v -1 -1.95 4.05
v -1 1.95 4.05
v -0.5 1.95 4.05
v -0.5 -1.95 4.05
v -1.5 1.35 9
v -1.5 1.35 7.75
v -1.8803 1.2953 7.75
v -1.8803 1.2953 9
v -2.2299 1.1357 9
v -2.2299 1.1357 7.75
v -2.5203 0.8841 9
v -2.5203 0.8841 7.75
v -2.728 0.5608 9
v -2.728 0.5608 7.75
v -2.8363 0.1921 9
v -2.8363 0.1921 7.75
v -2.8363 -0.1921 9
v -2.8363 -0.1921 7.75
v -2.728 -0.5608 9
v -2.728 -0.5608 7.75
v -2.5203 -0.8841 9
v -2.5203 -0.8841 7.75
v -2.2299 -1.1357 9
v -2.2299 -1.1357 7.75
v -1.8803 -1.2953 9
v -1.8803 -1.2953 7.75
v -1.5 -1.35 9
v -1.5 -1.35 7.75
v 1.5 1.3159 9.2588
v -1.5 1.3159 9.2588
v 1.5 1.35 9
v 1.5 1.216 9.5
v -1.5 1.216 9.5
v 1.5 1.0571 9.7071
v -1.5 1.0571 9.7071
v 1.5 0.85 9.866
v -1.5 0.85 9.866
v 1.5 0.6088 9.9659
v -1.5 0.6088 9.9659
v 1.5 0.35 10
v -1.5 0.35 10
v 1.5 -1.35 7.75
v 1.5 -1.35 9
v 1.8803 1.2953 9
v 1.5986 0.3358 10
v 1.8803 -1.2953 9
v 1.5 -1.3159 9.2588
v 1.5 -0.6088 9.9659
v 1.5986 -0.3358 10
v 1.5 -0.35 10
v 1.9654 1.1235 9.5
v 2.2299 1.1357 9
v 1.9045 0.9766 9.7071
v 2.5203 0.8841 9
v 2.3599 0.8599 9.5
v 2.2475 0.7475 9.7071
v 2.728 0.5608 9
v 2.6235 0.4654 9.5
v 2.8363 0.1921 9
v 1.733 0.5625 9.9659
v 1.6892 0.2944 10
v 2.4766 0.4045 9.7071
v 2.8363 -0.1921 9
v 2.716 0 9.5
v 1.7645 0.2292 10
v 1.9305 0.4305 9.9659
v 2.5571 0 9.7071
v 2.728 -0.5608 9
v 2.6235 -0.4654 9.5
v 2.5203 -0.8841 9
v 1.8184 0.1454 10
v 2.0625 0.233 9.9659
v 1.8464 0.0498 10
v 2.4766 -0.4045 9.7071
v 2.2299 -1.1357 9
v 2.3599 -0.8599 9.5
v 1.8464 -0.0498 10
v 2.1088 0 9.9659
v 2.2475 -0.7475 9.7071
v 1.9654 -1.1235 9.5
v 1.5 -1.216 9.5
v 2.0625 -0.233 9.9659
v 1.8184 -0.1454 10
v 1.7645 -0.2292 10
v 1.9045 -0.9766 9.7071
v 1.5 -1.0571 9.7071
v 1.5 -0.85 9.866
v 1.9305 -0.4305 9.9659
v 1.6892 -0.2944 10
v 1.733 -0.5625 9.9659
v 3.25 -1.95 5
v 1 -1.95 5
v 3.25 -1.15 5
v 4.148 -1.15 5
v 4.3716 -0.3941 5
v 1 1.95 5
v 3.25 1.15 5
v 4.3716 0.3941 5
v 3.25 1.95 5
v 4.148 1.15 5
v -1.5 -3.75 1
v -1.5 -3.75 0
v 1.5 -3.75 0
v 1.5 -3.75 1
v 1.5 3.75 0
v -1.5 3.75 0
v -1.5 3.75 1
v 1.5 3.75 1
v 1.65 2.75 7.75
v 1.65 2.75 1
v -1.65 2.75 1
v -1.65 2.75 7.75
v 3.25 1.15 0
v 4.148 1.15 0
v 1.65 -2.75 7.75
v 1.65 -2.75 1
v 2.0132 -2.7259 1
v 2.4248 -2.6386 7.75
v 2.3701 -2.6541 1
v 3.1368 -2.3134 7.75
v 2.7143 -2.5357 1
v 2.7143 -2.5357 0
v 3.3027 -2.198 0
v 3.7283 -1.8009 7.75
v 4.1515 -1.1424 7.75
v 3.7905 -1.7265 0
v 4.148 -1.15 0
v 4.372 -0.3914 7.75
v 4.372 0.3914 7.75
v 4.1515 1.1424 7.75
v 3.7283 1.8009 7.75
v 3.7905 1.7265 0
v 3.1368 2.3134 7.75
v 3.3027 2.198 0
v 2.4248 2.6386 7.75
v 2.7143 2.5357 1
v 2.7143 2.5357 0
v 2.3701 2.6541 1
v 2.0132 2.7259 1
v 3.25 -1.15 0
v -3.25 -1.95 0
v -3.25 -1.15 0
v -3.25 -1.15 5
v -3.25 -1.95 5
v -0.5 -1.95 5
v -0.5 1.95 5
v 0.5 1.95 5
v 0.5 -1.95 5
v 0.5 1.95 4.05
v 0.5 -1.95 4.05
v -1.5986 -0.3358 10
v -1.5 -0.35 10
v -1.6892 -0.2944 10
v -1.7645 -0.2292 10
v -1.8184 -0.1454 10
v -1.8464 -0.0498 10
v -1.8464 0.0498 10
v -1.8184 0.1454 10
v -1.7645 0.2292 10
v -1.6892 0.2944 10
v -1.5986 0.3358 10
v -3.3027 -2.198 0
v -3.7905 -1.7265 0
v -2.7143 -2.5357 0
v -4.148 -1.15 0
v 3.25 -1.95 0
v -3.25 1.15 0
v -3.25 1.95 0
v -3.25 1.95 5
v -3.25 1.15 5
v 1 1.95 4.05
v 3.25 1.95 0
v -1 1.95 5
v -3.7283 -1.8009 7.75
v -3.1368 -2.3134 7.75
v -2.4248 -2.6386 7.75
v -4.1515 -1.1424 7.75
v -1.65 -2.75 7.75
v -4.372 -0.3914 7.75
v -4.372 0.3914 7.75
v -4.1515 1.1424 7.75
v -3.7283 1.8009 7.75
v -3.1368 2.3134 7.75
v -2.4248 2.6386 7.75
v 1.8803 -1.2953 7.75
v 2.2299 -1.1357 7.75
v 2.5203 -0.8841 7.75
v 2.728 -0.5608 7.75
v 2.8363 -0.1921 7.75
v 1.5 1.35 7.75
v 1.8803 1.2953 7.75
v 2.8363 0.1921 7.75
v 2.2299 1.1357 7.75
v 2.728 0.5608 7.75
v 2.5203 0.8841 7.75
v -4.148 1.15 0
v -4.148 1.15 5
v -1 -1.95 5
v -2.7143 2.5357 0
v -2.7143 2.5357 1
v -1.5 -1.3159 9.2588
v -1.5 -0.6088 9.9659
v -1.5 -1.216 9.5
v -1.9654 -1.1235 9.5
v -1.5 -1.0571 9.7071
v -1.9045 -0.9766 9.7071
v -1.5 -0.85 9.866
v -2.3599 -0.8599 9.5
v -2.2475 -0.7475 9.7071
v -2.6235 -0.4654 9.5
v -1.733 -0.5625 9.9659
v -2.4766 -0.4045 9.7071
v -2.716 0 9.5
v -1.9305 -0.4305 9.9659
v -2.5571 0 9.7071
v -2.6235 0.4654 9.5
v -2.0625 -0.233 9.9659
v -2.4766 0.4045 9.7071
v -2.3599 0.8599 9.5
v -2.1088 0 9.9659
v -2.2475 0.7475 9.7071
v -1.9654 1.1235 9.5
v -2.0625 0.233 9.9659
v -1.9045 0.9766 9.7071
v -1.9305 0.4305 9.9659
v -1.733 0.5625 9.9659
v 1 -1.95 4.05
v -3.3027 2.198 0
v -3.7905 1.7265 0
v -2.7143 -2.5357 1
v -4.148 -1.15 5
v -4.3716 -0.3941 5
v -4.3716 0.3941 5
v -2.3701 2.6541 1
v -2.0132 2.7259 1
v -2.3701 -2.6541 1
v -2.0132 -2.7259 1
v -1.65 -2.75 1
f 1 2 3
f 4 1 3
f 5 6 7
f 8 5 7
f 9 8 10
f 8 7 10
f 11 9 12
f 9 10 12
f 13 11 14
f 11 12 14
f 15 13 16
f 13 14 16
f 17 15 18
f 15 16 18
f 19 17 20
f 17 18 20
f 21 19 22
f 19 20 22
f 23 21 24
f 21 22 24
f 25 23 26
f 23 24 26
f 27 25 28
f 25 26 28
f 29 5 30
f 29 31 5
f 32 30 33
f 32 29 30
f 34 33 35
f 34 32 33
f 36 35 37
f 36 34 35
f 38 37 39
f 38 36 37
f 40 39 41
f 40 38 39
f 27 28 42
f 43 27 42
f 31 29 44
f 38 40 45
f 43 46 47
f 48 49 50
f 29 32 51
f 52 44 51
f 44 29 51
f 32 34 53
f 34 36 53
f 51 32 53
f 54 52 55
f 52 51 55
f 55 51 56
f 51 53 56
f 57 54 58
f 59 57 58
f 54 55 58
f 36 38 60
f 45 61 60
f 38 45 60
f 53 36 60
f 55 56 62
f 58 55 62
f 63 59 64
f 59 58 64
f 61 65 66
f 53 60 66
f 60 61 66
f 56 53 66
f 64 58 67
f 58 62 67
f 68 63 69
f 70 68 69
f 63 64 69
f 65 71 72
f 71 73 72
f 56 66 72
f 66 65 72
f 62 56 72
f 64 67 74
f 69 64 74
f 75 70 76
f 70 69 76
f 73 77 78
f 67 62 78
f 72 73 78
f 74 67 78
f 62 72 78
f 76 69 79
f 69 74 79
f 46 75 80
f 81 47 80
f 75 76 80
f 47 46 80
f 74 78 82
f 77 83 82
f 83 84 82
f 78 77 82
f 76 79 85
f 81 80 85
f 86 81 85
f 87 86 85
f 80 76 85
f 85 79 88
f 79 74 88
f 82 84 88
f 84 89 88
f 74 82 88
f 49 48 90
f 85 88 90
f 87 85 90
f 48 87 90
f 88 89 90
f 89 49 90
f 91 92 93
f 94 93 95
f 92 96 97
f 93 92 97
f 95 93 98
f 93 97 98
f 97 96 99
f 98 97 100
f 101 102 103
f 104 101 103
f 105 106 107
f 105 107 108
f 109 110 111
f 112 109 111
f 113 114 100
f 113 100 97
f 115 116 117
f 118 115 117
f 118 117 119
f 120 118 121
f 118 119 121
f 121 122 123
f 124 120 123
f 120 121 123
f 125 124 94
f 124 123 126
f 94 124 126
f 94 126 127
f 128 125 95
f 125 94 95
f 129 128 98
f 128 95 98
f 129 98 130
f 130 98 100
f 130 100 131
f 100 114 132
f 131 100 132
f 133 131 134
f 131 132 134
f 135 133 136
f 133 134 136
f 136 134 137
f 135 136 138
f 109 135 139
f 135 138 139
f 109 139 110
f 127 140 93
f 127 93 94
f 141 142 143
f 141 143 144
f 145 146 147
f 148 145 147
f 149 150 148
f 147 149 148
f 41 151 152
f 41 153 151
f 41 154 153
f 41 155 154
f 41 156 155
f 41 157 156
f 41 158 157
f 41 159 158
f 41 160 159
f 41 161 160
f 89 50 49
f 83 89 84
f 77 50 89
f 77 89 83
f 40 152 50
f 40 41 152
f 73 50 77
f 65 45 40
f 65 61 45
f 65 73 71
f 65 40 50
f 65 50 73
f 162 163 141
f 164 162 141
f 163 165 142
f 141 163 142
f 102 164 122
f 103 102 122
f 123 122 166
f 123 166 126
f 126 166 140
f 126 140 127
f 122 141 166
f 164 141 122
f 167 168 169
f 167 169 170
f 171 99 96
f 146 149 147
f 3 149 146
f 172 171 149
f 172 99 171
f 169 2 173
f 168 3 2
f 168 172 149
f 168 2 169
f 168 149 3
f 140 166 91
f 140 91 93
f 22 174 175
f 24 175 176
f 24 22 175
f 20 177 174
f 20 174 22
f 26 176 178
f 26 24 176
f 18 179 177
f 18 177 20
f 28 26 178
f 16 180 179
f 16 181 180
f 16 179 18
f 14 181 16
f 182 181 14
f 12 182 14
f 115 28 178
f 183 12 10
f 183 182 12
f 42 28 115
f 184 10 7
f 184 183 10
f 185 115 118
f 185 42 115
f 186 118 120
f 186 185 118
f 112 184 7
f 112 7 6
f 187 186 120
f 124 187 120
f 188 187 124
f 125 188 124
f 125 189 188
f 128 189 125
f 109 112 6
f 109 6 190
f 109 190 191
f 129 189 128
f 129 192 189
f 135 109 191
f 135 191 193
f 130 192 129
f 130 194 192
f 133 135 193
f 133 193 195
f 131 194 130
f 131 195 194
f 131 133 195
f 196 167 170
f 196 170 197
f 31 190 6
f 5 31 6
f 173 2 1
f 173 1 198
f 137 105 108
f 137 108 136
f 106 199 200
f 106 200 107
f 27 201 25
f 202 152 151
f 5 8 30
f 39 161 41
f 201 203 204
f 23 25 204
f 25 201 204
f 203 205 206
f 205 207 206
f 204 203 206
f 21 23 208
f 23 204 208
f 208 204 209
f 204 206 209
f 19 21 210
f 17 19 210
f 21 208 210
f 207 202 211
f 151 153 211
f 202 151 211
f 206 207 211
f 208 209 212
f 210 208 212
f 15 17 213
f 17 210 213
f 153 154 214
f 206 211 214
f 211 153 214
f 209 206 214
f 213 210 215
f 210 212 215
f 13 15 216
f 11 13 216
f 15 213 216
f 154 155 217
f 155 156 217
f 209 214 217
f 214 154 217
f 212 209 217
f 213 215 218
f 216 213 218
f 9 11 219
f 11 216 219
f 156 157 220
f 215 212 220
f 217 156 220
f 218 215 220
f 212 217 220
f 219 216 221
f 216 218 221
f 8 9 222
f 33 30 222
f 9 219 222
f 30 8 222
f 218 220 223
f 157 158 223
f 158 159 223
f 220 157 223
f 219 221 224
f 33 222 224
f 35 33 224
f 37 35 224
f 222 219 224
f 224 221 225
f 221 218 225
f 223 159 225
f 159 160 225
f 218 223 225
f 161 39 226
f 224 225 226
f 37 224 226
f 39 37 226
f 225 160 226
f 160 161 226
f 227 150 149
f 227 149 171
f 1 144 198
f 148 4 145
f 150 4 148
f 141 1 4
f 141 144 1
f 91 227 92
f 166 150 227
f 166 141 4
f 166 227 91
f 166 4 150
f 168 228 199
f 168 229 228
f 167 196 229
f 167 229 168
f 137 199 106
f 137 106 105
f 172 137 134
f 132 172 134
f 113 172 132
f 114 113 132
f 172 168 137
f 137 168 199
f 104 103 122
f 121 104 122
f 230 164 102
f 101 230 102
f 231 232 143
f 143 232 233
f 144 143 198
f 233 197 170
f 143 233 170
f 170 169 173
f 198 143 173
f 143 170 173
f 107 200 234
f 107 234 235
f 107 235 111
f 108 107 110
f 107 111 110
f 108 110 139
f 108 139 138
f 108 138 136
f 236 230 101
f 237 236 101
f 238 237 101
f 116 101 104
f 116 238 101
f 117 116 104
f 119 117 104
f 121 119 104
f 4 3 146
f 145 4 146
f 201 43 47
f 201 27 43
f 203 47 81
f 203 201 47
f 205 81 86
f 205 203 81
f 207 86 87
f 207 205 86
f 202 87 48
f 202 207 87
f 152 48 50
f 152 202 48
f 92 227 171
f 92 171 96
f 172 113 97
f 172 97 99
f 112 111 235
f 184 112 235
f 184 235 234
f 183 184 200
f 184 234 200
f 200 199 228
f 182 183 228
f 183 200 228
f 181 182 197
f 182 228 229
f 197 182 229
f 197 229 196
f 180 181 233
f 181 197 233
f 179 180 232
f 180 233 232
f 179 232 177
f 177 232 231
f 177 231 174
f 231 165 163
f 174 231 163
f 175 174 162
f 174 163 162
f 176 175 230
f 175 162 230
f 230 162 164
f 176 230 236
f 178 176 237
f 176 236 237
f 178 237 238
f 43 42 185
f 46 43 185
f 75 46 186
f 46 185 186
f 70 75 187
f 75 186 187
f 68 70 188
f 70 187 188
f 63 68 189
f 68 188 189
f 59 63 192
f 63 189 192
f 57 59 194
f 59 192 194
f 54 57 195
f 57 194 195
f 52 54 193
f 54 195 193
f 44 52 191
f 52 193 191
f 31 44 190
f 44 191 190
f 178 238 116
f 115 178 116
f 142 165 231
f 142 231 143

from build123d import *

# Parameters (mm, degrees)
PAD_DEPTH       = 10
POCKET_DEPTH    = 5
SKETCH002_W     = 0.5
SKETCH002_H     = 0.95
PAD001_DEPTH    = 2
SKETCH005_W     = 10
SKETCH005_H     = 10
POCKET001_DEPTH = 2.251
PAD002_DEPTH    = 1
FILLET_R        = 1


with BuildPart() as part:
    # Sketch → Pad (new body)
    with BuildSketch(Plane.XY):
        with BuildLine():
            ThreePointArc((-1.65, 2.75), (-4.4, 0), (-1.65, -2.75))
            Line((-1.65, -2.75), (1.65, -2.75))
            ThreePointArc((1.65, -2.75), (4.4, 0), (1.65, 2.75))
            Line((1.65, 2.75), (-1.65, 2.75))
        make_face()
    extrude(amount=PAD_DEPTH)

    # Sketch001 → Pocket (cut)
    with BuildSketch(Plane.XY):
        Polygon((-3.25, 1.95), (-3.25, 1.15), (-5.25, 1.15), (-5.25, -1.15), (-3.25, -1.15), (-3.25, -1.95), (3.25, -1.95), (3.25, -1.15), (5.25, -1.15), (5.25, 1.15), (3.25, 1.15), (3.25, 1.95), align=None)
    extrude(amount=POCKET_DEPTH, mode=Mode.SUBTRACT)

    # Sketch002 → Pad001 (join, symmetric)
    with BuildSketch(Plane.XZ):
        with Locations((-0.75, 4.525)):
            Rectangle(SKETCH002_W, SKETCH002_H)
        with Locations((0.75, 4.525)):
            Rectangle(SKETCH002_W, SKETCH002_H)
    extrude(amount=PAD001_DEPTH, both=True)

    # Sketch005 (on DatumPlane) → Pocket001 (cut, through all)
    with BuildSketch(Plane.XY.offset(7.75)):
        Rectangle(SKETCH005_W, SKETCH005_H)
        with BuildLine():
            ThreePointArc((-1.5, 1.35), (-2.85, 0), (-1.5, -1.35))
            Line((-1.5, -1.35), (1.5, -1.35))
            ThreePointArc((1.5, -1.35), (2.85, 0), (1.5, 1.35))
            Line((1.5, 1.35), (-1.5, 1.35))
        make_face(mode=Mode.SUBTRACT)
    extrude(amount=POCKET001_DEPTH, mode=Mode.SUBTRACT)

    # Sketch006 → Pad002 (join)
    with BuildSketch(Plane.XY):
        Polygon((-2.714303, -2.535697), (-1.5, -3.75), (1.5, -3.75), (2.714303, -2.535697), align=None)
    pad002 = extrude(amount=PAD002_DEPTH)

    # Mirrored: Pad002 across XZ
    add(pad002.mirror(Plane.XZ))

    # Fillet
    fillet_edges = [part.edges().sort_by_distance(p)[0] for p in [
        (0, -1.35, 10),
        (2.85, 0, 10),
        (0, 1.35, 10),
        (-2.85, 0, 10),
    ]]
    fillet(fillet_edges, radius=FILLET_R)


solid = part.part
